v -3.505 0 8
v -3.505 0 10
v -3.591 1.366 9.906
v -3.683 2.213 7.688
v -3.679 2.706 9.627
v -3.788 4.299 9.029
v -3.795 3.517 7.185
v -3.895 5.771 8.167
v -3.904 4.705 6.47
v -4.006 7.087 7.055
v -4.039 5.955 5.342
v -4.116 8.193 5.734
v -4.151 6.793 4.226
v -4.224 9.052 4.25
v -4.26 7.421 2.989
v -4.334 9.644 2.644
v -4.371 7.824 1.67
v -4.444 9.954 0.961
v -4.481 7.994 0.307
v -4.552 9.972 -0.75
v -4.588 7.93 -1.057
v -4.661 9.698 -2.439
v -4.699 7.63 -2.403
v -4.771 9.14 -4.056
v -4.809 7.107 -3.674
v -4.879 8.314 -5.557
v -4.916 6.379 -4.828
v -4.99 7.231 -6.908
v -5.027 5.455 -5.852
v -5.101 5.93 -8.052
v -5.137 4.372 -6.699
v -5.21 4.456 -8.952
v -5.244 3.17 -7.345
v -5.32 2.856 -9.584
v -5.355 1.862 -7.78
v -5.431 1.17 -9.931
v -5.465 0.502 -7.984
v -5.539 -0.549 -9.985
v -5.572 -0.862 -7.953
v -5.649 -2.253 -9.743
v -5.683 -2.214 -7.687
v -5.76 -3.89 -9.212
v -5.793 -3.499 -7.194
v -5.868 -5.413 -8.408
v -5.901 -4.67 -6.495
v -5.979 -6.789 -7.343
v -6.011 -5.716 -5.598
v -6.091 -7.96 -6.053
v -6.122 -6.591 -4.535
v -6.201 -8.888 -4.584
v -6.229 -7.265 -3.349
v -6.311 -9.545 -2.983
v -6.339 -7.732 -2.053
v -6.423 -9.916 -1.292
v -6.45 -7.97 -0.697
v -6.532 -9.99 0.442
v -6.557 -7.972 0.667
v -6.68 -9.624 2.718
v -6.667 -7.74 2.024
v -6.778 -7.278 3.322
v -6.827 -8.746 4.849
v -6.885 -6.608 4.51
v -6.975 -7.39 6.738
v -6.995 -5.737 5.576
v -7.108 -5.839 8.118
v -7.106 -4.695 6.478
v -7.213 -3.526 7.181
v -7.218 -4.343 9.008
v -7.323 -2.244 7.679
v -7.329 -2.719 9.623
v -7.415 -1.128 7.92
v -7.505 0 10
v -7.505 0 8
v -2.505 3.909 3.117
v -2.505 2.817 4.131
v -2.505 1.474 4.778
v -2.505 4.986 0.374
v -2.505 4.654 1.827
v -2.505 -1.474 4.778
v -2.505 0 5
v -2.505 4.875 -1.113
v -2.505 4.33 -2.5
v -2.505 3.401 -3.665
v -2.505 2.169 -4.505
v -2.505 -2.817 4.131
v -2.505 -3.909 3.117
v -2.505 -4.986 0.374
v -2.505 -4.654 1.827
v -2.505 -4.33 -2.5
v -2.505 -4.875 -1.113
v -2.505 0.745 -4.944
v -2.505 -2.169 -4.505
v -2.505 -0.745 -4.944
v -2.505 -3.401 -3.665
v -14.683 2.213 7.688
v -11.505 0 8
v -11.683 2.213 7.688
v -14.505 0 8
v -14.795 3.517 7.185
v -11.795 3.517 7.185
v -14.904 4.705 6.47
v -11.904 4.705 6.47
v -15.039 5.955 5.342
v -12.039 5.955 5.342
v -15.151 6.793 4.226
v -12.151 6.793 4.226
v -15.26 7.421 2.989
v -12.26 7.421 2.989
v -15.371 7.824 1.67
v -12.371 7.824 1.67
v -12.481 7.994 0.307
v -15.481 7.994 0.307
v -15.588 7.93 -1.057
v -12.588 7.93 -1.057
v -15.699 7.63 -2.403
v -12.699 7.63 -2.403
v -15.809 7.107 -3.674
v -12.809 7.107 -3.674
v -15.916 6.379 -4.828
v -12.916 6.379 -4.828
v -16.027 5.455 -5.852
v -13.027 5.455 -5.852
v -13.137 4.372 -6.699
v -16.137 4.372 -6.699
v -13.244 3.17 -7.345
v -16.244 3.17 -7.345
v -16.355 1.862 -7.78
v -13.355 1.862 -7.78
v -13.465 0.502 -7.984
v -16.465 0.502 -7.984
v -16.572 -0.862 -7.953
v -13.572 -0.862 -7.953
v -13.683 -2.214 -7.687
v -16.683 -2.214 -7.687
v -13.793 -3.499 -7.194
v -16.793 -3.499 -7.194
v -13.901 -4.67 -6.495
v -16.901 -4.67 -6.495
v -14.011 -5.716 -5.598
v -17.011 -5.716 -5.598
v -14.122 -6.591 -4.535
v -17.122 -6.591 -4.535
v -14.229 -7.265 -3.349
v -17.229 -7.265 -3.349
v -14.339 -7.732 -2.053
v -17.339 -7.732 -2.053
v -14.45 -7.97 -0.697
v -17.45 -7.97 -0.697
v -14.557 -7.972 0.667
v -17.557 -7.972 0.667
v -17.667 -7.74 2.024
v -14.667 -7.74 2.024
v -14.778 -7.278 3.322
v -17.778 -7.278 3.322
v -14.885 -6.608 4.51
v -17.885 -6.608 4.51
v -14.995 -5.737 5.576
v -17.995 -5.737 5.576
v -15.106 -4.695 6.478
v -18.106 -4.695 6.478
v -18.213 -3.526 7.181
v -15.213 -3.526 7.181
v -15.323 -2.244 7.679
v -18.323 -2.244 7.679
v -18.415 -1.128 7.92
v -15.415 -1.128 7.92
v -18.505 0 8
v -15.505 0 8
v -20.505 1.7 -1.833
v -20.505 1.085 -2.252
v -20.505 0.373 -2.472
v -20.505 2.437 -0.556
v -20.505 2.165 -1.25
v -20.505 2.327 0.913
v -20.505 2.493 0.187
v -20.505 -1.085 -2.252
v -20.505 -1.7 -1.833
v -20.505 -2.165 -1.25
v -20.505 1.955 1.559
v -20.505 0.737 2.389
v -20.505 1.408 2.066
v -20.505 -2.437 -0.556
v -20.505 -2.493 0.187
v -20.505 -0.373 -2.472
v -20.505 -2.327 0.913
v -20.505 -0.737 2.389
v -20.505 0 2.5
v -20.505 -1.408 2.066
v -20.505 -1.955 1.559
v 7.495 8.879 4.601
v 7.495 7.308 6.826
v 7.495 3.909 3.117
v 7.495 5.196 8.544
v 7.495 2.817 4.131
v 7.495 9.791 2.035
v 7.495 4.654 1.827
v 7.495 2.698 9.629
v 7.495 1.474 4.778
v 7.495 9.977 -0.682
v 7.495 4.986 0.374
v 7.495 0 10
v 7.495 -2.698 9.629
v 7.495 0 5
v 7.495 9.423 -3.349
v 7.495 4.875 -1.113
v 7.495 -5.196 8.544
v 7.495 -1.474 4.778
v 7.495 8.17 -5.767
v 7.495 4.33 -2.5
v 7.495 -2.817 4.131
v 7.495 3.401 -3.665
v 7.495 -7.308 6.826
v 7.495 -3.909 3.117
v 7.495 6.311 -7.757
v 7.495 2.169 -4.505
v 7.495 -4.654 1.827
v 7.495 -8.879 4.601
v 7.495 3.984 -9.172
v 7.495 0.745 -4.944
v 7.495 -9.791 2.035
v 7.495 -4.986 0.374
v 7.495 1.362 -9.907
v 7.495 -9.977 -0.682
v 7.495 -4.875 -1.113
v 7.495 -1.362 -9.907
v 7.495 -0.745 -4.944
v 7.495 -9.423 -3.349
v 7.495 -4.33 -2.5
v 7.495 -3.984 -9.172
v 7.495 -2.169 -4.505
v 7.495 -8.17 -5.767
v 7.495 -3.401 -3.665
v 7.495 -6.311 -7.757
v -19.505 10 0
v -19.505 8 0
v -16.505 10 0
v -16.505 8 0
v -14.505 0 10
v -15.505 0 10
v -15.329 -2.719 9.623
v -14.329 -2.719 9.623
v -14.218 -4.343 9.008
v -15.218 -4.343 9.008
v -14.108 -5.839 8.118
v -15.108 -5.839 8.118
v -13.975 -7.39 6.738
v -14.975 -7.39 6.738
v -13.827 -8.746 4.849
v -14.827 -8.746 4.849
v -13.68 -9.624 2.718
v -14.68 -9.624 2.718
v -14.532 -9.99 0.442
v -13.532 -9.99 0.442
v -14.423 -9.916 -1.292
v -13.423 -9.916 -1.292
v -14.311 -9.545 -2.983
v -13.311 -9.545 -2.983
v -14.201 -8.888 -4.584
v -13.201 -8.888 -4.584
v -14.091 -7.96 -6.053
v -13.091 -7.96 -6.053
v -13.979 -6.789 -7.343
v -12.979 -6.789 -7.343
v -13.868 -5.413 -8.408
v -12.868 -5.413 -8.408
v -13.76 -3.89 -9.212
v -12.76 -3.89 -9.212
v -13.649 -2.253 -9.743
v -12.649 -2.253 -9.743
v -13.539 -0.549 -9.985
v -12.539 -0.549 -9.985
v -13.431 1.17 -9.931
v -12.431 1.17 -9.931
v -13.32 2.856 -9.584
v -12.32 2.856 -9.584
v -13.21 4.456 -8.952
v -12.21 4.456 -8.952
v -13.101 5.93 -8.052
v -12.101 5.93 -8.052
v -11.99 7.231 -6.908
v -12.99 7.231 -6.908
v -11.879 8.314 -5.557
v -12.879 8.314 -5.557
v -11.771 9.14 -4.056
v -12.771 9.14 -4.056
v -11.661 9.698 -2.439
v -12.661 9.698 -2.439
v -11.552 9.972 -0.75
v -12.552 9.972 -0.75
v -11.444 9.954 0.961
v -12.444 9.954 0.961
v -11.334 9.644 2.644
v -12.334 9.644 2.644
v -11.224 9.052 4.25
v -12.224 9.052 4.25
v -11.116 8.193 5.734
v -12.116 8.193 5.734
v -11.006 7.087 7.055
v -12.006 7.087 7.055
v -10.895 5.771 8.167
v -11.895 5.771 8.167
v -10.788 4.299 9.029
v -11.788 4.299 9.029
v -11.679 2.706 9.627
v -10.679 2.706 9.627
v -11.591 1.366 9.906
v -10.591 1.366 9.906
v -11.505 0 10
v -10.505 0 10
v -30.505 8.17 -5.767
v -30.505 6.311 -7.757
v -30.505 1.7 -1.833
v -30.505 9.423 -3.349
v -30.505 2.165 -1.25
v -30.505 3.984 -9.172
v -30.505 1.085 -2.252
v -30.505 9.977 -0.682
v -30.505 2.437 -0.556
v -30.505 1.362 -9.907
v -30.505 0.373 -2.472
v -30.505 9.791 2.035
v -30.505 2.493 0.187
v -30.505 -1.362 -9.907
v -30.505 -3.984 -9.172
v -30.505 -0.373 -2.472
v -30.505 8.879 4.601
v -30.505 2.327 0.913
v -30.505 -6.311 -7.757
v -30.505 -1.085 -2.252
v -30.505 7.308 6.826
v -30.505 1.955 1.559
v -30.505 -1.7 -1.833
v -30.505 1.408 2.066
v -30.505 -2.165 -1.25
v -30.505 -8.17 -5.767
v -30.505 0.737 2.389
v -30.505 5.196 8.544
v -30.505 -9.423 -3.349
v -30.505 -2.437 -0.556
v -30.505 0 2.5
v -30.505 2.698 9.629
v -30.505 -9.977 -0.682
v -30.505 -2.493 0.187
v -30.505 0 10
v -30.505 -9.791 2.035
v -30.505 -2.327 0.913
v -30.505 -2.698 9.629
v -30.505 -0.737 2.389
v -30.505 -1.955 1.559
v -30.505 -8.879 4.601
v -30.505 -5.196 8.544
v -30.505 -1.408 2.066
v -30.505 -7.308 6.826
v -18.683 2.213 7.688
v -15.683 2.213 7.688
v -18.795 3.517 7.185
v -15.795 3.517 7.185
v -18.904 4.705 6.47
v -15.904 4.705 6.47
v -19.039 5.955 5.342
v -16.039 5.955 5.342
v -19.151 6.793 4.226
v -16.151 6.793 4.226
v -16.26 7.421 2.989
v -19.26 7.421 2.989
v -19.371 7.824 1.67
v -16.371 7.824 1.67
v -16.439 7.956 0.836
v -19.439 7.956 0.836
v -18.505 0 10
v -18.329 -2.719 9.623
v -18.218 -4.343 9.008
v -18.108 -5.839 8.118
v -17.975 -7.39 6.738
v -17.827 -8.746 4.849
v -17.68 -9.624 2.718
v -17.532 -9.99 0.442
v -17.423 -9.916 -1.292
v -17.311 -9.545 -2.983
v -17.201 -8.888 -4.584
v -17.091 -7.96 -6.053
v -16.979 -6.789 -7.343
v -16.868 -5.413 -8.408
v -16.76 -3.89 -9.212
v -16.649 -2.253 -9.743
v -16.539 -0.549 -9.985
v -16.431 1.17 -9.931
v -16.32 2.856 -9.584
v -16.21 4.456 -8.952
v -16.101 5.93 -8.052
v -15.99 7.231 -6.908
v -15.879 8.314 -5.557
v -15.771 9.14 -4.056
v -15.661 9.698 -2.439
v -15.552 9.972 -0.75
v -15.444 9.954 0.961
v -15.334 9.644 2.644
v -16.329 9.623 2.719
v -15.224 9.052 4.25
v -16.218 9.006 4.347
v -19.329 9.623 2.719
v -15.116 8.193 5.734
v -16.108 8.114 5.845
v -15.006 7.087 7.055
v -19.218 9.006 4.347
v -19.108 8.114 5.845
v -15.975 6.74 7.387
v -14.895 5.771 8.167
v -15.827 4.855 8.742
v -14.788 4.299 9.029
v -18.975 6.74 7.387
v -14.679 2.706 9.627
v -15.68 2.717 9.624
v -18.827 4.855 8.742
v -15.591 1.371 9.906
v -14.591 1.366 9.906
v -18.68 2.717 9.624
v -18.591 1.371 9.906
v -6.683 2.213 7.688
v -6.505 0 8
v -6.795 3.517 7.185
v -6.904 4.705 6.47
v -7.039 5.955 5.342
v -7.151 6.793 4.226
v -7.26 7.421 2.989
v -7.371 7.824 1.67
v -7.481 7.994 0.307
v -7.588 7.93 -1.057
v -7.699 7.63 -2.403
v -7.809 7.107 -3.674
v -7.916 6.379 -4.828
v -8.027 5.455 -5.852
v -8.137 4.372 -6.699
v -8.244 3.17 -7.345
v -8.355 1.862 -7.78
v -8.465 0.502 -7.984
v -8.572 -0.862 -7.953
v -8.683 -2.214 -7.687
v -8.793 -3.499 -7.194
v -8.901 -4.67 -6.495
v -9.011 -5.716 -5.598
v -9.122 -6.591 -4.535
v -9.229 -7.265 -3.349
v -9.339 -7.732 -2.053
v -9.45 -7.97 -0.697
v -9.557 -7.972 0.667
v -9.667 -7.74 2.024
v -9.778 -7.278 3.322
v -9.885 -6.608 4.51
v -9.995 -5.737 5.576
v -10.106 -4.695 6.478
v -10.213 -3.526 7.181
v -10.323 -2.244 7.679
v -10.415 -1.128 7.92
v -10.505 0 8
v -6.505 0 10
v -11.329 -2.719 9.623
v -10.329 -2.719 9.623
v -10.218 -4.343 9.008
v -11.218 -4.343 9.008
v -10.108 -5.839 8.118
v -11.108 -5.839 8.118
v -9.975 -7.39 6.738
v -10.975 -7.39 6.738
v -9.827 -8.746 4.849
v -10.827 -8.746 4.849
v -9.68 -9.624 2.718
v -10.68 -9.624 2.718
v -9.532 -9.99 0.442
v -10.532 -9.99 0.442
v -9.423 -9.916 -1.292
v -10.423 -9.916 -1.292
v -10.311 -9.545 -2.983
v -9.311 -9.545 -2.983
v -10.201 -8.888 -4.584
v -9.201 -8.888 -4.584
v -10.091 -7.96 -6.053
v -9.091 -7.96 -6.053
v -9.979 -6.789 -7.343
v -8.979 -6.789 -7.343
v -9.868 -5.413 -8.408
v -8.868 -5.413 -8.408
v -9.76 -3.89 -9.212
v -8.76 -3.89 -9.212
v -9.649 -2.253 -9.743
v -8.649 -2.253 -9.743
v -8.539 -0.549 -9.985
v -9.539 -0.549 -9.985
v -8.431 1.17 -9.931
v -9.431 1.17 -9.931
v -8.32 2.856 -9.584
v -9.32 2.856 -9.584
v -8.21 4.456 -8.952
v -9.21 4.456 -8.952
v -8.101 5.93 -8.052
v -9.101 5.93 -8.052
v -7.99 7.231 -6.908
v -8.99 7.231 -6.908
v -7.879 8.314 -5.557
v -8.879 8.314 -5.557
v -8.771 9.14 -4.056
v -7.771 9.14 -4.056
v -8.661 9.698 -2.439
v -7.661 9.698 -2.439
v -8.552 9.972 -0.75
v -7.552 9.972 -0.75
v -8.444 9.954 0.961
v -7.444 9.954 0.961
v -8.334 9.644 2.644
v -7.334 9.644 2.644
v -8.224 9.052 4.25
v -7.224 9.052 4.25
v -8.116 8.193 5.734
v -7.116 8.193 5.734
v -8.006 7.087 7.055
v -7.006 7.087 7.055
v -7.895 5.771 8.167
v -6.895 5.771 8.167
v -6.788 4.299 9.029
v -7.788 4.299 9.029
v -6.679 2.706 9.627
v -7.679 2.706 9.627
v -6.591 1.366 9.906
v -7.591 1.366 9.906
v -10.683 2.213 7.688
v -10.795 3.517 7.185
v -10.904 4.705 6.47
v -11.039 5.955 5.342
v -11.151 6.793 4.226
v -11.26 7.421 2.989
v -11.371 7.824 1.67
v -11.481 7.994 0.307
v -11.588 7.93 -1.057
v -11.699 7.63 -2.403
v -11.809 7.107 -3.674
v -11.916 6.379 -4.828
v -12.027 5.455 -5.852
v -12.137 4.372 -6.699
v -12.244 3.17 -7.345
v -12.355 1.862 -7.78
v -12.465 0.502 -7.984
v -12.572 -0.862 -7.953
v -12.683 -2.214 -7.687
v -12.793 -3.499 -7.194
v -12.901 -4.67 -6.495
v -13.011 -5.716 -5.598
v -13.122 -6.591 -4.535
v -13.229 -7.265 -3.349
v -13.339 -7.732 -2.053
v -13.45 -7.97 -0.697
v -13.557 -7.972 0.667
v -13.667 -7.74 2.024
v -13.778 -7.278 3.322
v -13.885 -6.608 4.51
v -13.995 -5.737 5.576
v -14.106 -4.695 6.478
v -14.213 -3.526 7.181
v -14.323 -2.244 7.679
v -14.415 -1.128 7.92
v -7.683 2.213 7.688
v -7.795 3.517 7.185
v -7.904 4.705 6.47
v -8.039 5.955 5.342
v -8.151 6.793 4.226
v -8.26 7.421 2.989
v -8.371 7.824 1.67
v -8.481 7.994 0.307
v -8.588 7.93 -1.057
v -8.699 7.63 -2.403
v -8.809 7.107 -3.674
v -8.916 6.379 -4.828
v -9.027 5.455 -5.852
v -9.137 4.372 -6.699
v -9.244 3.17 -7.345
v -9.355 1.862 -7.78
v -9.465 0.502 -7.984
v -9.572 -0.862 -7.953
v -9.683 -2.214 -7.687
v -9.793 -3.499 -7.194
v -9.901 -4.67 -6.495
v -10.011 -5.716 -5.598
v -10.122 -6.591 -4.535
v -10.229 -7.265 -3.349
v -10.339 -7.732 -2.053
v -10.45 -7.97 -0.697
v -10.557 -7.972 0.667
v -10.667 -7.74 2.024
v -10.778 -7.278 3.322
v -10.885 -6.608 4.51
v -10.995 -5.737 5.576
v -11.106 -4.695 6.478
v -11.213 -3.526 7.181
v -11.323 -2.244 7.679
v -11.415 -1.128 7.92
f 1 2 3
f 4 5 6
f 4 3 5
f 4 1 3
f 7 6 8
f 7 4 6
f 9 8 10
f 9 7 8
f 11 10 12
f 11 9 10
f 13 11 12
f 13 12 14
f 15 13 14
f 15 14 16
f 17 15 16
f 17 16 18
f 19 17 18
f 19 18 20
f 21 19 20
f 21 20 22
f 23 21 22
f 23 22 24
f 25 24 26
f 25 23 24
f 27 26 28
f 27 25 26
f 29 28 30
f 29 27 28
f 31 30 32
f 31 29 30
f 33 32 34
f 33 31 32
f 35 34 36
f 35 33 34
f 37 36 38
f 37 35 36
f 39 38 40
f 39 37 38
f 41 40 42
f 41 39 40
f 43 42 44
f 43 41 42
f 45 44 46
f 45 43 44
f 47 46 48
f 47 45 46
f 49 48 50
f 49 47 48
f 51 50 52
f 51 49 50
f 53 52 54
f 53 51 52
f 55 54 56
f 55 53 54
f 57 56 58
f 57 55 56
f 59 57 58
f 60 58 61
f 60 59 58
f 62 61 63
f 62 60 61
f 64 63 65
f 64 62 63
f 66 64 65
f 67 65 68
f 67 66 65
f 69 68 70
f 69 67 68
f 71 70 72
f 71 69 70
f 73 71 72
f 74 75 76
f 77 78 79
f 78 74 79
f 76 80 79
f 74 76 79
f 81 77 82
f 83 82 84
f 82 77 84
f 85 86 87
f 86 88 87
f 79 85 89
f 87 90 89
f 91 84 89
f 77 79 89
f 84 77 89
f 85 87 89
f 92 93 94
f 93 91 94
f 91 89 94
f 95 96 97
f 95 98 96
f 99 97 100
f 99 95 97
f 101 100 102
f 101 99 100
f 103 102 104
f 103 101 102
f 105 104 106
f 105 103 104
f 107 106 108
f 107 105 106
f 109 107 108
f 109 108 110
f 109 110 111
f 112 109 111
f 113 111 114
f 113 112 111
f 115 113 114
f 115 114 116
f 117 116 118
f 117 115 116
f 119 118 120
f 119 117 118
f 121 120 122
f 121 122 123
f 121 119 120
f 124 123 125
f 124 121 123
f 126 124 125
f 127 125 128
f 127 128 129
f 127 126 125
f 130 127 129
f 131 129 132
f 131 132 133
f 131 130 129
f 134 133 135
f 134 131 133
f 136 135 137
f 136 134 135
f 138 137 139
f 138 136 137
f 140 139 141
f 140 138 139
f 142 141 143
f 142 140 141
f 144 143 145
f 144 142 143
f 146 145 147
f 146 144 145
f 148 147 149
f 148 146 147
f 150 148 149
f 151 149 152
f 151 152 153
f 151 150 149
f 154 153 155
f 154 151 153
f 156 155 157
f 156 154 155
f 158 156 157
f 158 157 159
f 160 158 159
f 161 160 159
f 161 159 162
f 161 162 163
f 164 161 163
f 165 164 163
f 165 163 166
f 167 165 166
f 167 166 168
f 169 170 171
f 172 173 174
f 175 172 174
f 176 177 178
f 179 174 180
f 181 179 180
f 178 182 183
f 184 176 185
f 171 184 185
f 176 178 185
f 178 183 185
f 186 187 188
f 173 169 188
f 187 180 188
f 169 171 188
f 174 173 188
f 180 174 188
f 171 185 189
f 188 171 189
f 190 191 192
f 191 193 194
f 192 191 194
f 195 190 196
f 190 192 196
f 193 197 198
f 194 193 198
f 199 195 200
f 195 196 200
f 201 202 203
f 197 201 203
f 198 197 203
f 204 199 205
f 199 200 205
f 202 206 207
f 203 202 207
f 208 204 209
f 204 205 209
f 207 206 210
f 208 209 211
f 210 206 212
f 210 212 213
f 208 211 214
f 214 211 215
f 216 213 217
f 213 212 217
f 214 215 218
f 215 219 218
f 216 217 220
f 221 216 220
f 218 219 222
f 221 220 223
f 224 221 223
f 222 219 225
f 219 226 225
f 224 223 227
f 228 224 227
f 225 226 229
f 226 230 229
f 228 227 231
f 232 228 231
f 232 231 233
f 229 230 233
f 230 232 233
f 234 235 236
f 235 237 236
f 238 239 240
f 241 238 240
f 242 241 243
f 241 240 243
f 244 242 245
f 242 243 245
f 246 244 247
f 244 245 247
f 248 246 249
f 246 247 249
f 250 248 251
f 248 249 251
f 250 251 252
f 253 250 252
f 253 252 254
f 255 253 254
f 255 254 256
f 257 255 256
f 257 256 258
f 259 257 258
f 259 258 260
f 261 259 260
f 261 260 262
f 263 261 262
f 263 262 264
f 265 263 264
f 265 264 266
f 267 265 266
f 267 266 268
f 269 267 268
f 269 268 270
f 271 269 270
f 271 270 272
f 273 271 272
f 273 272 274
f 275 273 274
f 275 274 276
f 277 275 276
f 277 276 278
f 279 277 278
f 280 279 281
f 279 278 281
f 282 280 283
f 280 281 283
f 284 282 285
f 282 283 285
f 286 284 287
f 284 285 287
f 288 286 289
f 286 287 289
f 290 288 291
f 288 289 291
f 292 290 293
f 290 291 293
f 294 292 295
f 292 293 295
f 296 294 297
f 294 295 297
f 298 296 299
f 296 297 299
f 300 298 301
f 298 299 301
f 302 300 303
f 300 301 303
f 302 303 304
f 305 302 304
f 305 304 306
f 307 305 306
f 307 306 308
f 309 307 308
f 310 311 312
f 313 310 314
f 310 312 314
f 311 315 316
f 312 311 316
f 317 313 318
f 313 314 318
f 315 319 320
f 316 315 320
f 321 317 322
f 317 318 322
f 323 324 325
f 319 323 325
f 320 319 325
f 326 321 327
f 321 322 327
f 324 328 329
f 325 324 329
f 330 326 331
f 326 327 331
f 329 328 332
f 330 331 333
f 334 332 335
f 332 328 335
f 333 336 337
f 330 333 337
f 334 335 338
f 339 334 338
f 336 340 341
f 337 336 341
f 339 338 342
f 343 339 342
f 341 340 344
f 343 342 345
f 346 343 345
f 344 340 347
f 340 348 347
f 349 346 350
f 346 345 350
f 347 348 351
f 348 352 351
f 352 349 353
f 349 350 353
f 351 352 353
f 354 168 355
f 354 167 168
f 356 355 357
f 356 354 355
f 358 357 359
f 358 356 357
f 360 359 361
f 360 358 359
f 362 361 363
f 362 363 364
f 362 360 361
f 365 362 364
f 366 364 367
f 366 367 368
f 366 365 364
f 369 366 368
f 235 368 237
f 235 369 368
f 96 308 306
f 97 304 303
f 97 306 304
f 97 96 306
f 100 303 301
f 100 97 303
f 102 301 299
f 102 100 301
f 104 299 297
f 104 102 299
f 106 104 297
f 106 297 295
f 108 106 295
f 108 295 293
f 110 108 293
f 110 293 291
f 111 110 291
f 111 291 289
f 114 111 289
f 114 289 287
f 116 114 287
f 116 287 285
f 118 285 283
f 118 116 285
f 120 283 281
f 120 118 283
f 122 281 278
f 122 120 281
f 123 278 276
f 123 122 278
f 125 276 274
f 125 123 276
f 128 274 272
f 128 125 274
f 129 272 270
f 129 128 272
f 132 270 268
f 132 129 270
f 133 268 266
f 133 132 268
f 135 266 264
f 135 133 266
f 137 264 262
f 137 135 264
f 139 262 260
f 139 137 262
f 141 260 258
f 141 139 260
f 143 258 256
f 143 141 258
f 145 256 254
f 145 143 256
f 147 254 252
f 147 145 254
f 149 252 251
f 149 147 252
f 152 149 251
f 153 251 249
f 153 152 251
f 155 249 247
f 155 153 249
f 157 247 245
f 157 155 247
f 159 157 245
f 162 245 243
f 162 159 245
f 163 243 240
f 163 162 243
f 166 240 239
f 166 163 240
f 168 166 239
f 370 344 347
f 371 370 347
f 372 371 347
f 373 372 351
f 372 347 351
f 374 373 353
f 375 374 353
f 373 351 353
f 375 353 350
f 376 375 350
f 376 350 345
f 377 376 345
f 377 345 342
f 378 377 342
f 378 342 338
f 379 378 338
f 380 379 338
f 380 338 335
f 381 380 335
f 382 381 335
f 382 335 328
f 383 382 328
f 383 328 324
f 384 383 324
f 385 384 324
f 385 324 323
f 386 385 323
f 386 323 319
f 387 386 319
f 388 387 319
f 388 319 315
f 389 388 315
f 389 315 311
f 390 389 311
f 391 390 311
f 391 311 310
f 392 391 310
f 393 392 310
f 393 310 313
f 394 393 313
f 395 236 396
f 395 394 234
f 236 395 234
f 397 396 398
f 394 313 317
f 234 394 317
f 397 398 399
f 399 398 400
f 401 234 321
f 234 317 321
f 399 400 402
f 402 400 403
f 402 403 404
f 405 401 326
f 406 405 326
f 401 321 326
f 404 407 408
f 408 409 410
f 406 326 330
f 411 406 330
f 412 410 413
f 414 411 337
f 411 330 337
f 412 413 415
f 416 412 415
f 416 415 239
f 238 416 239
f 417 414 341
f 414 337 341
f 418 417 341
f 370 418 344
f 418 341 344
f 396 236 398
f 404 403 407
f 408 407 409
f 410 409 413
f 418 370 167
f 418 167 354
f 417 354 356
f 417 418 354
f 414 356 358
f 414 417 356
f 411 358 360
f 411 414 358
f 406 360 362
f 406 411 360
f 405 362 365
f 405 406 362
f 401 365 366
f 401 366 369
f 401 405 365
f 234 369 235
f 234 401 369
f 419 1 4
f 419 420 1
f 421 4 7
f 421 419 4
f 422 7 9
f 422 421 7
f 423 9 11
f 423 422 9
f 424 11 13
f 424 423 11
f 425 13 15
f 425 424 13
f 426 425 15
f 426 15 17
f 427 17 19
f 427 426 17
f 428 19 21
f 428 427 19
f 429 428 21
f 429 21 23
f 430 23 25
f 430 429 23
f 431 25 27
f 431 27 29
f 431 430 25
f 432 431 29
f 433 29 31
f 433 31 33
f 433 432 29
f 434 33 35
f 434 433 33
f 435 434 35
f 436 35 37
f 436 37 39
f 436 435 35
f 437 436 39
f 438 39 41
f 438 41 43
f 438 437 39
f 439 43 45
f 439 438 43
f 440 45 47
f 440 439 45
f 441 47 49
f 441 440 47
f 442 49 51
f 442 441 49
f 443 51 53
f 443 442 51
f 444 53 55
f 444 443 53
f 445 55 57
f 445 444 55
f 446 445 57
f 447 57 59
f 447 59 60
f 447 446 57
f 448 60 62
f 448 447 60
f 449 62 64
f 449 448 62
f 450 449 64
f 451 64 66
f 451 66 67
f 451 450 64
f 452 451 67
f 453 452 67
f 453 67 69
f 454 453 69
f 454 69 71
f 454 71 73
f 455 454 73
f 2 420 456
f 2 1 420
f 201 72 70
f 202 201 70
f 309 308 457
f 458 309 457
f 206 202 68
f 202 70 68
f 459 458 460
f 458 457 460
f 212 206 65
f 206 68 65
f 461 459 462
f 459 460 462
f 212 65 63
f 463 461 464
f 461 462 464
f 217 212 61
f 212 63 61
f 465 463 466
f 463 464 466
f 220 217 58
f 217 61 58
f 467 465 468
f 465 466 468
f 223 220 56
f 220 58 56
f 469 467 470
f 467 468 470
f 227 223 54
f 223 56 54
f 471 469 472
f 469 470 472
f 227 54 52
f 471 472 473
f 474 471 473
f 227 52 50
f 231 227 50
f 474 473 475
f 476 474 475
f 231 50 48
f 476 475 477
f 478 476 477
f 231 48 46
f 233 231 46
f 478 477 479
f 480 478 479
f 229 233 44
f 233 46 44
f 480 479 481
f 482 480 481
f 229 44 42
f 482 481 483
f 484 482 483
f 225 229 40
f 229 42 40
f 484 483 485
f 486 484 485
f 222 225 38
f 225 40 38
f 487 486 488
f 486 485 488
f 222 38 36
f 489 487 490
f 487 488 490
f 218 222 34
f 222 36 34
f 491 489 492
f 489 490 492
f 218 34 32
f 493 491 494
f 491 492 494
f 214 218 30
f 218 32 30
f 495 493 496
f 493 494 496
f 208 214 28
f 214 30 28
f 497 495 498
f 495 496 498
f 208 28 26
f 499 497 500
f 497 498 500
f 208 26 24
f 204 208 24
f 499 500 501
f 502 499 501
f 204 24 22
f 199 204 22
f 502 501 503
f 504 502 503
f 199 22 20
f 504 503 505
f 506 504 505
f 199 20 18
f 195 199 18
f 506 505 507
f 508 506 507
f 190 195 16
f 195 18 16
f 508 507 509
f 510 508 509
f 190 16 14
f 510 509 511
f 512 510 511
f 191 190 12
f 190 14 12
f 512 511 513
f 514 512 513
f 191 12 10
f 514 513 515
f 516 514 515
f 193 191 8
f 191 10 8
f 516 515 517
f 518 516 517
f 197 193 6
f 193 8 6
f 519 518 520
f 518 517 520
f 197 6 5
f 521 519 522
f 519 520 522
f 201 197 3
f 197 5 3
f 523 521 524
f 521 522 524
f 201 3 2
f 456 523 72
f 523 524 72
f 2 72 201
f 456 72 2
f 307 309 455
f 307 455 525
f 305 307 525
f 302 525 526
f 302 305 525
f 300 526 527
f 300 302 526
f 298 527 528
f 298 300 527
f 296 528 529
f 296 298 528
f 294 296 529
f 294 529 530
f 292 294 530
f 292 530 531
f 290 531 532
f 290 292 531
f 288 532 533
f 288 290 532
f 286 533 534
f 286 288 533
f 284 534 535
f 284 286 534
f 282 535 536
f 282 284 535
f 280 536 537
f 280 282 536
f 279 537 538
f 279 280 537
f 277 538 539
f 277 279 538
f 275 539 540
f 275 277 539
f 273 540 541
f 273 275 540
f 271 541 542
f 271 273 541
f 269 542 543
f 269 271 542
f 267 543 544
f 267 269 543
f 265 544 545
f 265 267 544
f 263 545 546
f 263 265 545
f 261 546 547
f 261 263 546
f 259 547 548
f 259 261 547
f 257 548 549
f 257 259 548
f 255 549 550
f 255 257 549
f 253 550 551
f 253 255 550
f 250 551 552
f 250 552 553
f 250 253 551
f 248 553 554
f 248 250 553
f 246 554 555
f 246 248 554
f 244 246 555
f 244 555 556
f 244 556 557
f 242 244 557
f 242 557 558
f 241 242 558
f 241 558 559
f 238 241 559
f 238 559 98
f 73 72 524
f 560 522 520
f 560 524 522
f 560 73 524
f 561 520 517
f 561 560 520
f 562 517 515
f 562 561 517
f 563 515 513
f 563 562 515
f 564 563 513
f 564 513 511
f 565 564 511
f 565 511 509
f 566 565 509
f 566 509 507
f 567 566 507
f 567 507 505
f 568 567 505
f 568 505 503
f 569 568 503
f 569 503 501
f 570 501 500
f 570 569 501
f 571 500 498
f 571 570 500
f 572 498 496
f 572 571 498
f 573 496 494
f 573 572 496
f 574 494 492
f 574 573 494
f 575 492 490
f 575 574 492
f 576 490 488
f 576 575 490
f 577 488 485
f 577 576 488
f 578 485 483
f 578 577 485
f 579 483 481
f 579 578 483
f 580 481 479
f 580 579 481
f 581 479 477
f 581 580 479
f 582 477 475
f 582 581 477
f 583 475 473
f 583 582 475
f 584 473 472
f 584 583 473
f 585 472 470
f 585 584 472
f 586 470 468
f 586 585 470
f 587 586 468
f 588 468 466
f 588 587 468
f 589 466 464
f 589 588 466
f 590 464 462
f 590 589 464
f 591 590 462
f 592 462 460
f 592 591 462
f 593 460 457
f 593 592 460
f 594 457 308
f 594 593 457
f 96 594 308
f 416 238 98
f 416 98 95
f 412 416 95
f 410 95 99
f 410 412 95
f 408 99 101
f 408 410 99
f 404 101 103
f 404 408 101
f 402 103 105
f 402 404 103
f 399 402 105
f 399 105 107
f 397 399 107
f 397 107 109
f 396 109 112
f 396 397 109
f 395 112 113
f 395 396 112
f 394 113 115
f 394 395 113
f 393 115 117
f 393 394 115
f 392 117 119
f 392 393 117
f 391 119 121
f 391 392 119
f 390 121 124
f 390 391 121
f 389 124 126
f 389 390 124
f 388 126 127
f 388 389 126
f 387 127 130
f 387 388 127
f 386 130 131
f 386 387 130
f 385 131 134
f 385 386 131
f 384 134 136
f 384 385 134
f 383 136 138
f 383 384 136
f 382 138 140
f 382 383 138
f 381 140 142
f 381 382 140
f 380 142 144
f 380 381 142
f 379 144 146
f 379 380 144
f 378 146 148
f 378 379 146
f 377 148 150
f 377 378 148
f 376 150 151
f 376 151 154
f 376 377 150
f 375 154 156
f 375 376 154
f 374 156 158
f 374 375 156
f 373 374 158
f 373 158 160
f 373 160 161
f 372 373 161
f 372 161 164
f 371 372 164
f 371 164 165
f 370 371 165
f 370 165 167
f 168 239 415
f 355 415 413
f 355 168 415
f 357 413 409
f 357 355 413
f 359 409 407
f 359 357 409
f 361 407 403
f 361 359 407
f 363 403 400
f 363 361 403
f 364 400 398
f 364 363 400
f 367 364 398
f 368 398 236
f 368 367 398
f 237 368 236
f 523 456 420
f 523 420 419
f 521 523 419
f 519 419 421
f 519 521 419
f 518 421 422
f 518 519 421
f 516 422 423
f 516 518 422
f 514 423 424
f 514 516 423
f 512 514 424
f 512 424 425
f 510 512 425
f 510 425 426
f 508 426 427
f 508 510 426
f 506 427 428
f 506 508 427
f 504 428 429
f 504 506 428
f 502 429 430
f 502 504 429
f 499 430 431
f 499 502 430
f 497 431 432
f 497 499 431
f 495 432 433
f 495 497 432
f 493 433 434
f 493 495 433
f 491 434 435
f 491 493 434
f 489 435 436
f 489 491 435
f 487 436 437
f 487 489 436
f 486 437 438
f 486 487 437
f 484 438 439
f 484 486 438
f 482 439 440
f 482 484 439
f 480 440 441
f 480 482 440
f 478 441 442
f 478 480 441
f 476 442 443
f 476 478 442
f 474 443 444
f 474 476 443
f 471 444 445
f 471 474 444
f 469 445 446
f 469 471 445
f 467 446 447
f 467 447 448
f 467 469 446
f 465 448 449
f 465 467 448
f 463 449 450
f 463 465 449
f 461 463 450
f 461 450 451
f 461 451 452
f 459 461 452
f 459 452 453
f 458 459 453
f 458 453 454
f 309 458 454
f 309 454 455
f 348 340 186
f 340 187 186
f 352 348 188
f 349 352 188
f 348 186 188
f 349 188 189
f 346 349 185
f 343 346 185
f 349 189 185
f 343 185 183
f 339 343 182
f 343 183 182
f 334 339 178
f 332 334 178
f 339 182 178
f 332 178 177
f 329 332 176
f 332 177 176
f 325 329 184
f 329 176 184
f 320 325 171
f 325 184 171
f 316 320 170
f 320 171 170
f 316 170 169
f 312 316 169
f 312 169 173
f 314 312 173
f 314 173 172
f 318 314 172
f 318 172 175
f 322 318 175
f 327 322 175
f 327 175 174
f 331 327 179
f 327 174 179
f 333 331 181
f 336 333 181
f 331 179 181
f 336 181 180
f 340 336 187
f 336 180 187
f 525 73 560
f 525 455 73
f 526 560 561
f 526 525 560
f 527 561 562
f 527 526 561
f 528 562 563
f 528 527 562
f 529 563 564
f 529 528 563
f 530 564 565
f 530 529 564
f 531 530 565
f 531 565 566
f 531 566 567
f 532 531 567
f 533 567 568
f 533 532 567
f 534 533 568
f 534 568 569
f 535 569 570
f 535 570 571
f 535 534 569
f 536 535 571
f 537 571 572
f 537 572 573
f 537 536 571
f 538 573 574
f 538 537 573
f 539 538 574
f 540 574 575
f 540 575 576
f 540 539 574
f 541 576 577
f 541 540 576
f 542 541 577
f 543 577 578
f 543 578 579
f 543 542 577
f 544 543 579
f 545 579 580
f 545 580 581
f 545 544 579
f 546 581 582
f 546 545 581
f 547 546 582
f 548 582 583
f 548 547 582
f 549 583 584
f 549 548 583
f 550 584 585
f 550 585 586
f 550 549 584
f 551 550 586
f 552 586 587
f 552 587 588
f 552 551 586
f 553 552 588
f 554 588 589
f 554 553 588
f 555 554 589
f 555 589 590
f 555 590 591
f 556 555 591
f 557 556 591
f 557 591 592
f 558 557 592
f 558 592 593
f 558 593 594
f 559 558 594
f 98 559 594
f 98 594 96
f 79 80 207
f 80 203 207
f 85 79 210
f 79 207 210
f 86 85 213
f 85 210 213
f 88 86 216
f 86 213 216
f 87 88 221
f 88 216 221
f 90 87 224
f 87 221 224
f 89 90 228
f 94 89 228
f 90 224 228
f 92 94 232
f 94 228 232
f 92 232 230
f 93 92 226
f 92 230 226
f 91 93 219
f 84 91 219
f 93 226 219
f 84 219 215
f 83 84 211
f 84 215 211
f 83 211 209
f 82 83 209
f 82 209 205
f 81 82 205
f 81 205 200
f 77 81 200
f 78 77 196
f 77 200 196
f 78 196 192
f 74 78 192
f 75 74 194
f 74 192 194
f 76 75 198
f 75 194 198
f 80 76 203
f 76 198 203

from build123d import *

# Parameters (mm, degrees)
CUT_SWEEP1_PITCH = 4


with BuildPart() as part:
    # Sketch1 → Revolve1 (revolve)
    with BuildSketch(Plane.XY, mode=Mode.PRIVATE) as revolve1_sk:
        Polygon((7.495497647, 5), (7.495497647, 10), (-30.504502353, 10), (-30.504502353, 2.5), (-20.504502353, 2.5), (-20.504502353, 0), (-2.504502353, 0), (-2.504502353, 5), align=None)
    revolve(revolve1_sk.sketch.rotate(Axis((-30.504502353, 0, 0), (1, 0, 0)), 90), axis=Axis((-30.504502353, 0, 0), (1, 0, 0)))

    # Cut-Sweep1: arcs per turn and ends read off the stored shape
    # Cut-Sweep1: the profile of Sketch2 profile screwed along a right-hand helix through 3.25 turns, 12 arcs to a turn; built about Z, then put on its axis
    cut_sweep1_z = Axis((0, 0, 0), (0, 0, 1))
    cut_sweep1_corners = [(10.0003, 3.1417e-05, -7.495495647), (10.0003, 3.1417e-05, -10.495495647), (8, 2.5133e-05, -10.495495647), (8, 2.5133e-05, -7.495495647)]
    with BuildLine(mode=Mode.PRIVATE) as cut_sweep1_profile:
        Line(cut_sweep1_corners[0], cut_sweep1_corners[1])
        Line(cut_sweep1_corners[1], cut_sweep1_corners[2])
        Line(cut_sweep1_corners[2], cut_sweep1_corners[3])
        Line(cut_sweep1_corners[3], cut_sweep1_corners[0])
    cut_sweep1_cap = Face(cut_sweep1_profile.wire())
    cut_sweep1_turn_angles = [0, 15, 30, 45, 60, 75, 90, 105, 120, 135, 150, 165, 180, 195, 210, 225, 240, 255, 270, 285, 300, 315, 330, 345, 360]
    cut_sweep1_turn_weights = [1, 0.9659258262890683, 1, 0.9659258262890683, 1, 0.9659258262890683, 1, 0.9659258262890683, 1, 0.9659258262890683, 1, 0.9659258262890683, 1, 0.9659258262890683, 1, 0.9659258262890683, 1, 0.9659258262890683, 1, 0.9659258262890683, 1, 0.9659258262890683, 1, 0.9659258262890683, 1]
    cut_sweep1_turn_rails = [Edge.make_bspline([Vector(p[0], p[1], 0).rotate(cut_sweep1_z, cut_sweep1_turn_angles[k]) / cut_sweep1_turn_weights[k] + Vector(0, 0, p[2] + CUT_SWEEP1_PITCH * cut_sweep1_turn_angles[k] / 360) for k in range(25)], [0, 0, 0, 1, 1, 2, 2, 3, 3, 4, 4, 5, 5, 6, 6, 7, 7, 8, 8, 9, 9, 10, 10, 11, 11, 12, 12, 12], 2, cut_sweep1_turn_weights) for p in cut_sweep1_corners]
    cut_sweep1_turn_sides = [Face.make_surface_from_curves(cut_sweep1_turn_rails[p[0]], cut_sweep1_turn_rails[p[1]]) for p in [(0, 1), (1, 2), (2, 3), (3, 0)]]
    cut_sweep1_last_angles = [1080, 1095, 1110, 1125, 1140, 1155, 1170]
    cut_sweep1_last_weights = [1, 0.9659258262890683, 1, 0.9659258262890683, 1, 0.9659258262890646, 1]
    cut_sweep1_last_rails = [Edge.make_bspline([Vector(p[0], p[1], 0).rotate(cut_sweep1_z, cut_sweep1_last_angles[k]) / cut_sweep1_last_weights[k] + Vector(0, 0, p[2] + CUT_SWEEP1_PITCH * cut_sweep1_last_angles[k] / 360) for k in range(7)], [0, 0, 0, 1, 1, 2, 2, 3, 3, 3], 2, cut_sweep1_last_weights) for p in cut_sweep1_corners]
    cut_sweep1_last_sides = [Face.make_surface_from_curves(cut_sweep1_last_rails[p[0]], cut_sweep1_last_rails[p[1]]) for p in [(0, 1), (1, 2), (2, 3), (3, 0)]]
    cut_sweep1 = Plane(origin=(-14, 0, 0), x_dir=(0, 0, 1), z_dir=(-1, 0, 0)) * Solid(Shell([*[p.moved(Location((0, 0, CUT_SWEEP1_PITCH * i))) for i in range(3) for p in cut_sweep1_turn_sides], *cut_sweep1_last_sides, cut_sweep1_cap, cut_sweep1_cap.rotate(cut_sweep1_z, 1170).moved(Location((0, 0, CUT_SWEEP1_PITCH * 1170 / 360)))]))
    add(cut_sweep1, mode=Mode.SUBTRACT)


solid = part.part
